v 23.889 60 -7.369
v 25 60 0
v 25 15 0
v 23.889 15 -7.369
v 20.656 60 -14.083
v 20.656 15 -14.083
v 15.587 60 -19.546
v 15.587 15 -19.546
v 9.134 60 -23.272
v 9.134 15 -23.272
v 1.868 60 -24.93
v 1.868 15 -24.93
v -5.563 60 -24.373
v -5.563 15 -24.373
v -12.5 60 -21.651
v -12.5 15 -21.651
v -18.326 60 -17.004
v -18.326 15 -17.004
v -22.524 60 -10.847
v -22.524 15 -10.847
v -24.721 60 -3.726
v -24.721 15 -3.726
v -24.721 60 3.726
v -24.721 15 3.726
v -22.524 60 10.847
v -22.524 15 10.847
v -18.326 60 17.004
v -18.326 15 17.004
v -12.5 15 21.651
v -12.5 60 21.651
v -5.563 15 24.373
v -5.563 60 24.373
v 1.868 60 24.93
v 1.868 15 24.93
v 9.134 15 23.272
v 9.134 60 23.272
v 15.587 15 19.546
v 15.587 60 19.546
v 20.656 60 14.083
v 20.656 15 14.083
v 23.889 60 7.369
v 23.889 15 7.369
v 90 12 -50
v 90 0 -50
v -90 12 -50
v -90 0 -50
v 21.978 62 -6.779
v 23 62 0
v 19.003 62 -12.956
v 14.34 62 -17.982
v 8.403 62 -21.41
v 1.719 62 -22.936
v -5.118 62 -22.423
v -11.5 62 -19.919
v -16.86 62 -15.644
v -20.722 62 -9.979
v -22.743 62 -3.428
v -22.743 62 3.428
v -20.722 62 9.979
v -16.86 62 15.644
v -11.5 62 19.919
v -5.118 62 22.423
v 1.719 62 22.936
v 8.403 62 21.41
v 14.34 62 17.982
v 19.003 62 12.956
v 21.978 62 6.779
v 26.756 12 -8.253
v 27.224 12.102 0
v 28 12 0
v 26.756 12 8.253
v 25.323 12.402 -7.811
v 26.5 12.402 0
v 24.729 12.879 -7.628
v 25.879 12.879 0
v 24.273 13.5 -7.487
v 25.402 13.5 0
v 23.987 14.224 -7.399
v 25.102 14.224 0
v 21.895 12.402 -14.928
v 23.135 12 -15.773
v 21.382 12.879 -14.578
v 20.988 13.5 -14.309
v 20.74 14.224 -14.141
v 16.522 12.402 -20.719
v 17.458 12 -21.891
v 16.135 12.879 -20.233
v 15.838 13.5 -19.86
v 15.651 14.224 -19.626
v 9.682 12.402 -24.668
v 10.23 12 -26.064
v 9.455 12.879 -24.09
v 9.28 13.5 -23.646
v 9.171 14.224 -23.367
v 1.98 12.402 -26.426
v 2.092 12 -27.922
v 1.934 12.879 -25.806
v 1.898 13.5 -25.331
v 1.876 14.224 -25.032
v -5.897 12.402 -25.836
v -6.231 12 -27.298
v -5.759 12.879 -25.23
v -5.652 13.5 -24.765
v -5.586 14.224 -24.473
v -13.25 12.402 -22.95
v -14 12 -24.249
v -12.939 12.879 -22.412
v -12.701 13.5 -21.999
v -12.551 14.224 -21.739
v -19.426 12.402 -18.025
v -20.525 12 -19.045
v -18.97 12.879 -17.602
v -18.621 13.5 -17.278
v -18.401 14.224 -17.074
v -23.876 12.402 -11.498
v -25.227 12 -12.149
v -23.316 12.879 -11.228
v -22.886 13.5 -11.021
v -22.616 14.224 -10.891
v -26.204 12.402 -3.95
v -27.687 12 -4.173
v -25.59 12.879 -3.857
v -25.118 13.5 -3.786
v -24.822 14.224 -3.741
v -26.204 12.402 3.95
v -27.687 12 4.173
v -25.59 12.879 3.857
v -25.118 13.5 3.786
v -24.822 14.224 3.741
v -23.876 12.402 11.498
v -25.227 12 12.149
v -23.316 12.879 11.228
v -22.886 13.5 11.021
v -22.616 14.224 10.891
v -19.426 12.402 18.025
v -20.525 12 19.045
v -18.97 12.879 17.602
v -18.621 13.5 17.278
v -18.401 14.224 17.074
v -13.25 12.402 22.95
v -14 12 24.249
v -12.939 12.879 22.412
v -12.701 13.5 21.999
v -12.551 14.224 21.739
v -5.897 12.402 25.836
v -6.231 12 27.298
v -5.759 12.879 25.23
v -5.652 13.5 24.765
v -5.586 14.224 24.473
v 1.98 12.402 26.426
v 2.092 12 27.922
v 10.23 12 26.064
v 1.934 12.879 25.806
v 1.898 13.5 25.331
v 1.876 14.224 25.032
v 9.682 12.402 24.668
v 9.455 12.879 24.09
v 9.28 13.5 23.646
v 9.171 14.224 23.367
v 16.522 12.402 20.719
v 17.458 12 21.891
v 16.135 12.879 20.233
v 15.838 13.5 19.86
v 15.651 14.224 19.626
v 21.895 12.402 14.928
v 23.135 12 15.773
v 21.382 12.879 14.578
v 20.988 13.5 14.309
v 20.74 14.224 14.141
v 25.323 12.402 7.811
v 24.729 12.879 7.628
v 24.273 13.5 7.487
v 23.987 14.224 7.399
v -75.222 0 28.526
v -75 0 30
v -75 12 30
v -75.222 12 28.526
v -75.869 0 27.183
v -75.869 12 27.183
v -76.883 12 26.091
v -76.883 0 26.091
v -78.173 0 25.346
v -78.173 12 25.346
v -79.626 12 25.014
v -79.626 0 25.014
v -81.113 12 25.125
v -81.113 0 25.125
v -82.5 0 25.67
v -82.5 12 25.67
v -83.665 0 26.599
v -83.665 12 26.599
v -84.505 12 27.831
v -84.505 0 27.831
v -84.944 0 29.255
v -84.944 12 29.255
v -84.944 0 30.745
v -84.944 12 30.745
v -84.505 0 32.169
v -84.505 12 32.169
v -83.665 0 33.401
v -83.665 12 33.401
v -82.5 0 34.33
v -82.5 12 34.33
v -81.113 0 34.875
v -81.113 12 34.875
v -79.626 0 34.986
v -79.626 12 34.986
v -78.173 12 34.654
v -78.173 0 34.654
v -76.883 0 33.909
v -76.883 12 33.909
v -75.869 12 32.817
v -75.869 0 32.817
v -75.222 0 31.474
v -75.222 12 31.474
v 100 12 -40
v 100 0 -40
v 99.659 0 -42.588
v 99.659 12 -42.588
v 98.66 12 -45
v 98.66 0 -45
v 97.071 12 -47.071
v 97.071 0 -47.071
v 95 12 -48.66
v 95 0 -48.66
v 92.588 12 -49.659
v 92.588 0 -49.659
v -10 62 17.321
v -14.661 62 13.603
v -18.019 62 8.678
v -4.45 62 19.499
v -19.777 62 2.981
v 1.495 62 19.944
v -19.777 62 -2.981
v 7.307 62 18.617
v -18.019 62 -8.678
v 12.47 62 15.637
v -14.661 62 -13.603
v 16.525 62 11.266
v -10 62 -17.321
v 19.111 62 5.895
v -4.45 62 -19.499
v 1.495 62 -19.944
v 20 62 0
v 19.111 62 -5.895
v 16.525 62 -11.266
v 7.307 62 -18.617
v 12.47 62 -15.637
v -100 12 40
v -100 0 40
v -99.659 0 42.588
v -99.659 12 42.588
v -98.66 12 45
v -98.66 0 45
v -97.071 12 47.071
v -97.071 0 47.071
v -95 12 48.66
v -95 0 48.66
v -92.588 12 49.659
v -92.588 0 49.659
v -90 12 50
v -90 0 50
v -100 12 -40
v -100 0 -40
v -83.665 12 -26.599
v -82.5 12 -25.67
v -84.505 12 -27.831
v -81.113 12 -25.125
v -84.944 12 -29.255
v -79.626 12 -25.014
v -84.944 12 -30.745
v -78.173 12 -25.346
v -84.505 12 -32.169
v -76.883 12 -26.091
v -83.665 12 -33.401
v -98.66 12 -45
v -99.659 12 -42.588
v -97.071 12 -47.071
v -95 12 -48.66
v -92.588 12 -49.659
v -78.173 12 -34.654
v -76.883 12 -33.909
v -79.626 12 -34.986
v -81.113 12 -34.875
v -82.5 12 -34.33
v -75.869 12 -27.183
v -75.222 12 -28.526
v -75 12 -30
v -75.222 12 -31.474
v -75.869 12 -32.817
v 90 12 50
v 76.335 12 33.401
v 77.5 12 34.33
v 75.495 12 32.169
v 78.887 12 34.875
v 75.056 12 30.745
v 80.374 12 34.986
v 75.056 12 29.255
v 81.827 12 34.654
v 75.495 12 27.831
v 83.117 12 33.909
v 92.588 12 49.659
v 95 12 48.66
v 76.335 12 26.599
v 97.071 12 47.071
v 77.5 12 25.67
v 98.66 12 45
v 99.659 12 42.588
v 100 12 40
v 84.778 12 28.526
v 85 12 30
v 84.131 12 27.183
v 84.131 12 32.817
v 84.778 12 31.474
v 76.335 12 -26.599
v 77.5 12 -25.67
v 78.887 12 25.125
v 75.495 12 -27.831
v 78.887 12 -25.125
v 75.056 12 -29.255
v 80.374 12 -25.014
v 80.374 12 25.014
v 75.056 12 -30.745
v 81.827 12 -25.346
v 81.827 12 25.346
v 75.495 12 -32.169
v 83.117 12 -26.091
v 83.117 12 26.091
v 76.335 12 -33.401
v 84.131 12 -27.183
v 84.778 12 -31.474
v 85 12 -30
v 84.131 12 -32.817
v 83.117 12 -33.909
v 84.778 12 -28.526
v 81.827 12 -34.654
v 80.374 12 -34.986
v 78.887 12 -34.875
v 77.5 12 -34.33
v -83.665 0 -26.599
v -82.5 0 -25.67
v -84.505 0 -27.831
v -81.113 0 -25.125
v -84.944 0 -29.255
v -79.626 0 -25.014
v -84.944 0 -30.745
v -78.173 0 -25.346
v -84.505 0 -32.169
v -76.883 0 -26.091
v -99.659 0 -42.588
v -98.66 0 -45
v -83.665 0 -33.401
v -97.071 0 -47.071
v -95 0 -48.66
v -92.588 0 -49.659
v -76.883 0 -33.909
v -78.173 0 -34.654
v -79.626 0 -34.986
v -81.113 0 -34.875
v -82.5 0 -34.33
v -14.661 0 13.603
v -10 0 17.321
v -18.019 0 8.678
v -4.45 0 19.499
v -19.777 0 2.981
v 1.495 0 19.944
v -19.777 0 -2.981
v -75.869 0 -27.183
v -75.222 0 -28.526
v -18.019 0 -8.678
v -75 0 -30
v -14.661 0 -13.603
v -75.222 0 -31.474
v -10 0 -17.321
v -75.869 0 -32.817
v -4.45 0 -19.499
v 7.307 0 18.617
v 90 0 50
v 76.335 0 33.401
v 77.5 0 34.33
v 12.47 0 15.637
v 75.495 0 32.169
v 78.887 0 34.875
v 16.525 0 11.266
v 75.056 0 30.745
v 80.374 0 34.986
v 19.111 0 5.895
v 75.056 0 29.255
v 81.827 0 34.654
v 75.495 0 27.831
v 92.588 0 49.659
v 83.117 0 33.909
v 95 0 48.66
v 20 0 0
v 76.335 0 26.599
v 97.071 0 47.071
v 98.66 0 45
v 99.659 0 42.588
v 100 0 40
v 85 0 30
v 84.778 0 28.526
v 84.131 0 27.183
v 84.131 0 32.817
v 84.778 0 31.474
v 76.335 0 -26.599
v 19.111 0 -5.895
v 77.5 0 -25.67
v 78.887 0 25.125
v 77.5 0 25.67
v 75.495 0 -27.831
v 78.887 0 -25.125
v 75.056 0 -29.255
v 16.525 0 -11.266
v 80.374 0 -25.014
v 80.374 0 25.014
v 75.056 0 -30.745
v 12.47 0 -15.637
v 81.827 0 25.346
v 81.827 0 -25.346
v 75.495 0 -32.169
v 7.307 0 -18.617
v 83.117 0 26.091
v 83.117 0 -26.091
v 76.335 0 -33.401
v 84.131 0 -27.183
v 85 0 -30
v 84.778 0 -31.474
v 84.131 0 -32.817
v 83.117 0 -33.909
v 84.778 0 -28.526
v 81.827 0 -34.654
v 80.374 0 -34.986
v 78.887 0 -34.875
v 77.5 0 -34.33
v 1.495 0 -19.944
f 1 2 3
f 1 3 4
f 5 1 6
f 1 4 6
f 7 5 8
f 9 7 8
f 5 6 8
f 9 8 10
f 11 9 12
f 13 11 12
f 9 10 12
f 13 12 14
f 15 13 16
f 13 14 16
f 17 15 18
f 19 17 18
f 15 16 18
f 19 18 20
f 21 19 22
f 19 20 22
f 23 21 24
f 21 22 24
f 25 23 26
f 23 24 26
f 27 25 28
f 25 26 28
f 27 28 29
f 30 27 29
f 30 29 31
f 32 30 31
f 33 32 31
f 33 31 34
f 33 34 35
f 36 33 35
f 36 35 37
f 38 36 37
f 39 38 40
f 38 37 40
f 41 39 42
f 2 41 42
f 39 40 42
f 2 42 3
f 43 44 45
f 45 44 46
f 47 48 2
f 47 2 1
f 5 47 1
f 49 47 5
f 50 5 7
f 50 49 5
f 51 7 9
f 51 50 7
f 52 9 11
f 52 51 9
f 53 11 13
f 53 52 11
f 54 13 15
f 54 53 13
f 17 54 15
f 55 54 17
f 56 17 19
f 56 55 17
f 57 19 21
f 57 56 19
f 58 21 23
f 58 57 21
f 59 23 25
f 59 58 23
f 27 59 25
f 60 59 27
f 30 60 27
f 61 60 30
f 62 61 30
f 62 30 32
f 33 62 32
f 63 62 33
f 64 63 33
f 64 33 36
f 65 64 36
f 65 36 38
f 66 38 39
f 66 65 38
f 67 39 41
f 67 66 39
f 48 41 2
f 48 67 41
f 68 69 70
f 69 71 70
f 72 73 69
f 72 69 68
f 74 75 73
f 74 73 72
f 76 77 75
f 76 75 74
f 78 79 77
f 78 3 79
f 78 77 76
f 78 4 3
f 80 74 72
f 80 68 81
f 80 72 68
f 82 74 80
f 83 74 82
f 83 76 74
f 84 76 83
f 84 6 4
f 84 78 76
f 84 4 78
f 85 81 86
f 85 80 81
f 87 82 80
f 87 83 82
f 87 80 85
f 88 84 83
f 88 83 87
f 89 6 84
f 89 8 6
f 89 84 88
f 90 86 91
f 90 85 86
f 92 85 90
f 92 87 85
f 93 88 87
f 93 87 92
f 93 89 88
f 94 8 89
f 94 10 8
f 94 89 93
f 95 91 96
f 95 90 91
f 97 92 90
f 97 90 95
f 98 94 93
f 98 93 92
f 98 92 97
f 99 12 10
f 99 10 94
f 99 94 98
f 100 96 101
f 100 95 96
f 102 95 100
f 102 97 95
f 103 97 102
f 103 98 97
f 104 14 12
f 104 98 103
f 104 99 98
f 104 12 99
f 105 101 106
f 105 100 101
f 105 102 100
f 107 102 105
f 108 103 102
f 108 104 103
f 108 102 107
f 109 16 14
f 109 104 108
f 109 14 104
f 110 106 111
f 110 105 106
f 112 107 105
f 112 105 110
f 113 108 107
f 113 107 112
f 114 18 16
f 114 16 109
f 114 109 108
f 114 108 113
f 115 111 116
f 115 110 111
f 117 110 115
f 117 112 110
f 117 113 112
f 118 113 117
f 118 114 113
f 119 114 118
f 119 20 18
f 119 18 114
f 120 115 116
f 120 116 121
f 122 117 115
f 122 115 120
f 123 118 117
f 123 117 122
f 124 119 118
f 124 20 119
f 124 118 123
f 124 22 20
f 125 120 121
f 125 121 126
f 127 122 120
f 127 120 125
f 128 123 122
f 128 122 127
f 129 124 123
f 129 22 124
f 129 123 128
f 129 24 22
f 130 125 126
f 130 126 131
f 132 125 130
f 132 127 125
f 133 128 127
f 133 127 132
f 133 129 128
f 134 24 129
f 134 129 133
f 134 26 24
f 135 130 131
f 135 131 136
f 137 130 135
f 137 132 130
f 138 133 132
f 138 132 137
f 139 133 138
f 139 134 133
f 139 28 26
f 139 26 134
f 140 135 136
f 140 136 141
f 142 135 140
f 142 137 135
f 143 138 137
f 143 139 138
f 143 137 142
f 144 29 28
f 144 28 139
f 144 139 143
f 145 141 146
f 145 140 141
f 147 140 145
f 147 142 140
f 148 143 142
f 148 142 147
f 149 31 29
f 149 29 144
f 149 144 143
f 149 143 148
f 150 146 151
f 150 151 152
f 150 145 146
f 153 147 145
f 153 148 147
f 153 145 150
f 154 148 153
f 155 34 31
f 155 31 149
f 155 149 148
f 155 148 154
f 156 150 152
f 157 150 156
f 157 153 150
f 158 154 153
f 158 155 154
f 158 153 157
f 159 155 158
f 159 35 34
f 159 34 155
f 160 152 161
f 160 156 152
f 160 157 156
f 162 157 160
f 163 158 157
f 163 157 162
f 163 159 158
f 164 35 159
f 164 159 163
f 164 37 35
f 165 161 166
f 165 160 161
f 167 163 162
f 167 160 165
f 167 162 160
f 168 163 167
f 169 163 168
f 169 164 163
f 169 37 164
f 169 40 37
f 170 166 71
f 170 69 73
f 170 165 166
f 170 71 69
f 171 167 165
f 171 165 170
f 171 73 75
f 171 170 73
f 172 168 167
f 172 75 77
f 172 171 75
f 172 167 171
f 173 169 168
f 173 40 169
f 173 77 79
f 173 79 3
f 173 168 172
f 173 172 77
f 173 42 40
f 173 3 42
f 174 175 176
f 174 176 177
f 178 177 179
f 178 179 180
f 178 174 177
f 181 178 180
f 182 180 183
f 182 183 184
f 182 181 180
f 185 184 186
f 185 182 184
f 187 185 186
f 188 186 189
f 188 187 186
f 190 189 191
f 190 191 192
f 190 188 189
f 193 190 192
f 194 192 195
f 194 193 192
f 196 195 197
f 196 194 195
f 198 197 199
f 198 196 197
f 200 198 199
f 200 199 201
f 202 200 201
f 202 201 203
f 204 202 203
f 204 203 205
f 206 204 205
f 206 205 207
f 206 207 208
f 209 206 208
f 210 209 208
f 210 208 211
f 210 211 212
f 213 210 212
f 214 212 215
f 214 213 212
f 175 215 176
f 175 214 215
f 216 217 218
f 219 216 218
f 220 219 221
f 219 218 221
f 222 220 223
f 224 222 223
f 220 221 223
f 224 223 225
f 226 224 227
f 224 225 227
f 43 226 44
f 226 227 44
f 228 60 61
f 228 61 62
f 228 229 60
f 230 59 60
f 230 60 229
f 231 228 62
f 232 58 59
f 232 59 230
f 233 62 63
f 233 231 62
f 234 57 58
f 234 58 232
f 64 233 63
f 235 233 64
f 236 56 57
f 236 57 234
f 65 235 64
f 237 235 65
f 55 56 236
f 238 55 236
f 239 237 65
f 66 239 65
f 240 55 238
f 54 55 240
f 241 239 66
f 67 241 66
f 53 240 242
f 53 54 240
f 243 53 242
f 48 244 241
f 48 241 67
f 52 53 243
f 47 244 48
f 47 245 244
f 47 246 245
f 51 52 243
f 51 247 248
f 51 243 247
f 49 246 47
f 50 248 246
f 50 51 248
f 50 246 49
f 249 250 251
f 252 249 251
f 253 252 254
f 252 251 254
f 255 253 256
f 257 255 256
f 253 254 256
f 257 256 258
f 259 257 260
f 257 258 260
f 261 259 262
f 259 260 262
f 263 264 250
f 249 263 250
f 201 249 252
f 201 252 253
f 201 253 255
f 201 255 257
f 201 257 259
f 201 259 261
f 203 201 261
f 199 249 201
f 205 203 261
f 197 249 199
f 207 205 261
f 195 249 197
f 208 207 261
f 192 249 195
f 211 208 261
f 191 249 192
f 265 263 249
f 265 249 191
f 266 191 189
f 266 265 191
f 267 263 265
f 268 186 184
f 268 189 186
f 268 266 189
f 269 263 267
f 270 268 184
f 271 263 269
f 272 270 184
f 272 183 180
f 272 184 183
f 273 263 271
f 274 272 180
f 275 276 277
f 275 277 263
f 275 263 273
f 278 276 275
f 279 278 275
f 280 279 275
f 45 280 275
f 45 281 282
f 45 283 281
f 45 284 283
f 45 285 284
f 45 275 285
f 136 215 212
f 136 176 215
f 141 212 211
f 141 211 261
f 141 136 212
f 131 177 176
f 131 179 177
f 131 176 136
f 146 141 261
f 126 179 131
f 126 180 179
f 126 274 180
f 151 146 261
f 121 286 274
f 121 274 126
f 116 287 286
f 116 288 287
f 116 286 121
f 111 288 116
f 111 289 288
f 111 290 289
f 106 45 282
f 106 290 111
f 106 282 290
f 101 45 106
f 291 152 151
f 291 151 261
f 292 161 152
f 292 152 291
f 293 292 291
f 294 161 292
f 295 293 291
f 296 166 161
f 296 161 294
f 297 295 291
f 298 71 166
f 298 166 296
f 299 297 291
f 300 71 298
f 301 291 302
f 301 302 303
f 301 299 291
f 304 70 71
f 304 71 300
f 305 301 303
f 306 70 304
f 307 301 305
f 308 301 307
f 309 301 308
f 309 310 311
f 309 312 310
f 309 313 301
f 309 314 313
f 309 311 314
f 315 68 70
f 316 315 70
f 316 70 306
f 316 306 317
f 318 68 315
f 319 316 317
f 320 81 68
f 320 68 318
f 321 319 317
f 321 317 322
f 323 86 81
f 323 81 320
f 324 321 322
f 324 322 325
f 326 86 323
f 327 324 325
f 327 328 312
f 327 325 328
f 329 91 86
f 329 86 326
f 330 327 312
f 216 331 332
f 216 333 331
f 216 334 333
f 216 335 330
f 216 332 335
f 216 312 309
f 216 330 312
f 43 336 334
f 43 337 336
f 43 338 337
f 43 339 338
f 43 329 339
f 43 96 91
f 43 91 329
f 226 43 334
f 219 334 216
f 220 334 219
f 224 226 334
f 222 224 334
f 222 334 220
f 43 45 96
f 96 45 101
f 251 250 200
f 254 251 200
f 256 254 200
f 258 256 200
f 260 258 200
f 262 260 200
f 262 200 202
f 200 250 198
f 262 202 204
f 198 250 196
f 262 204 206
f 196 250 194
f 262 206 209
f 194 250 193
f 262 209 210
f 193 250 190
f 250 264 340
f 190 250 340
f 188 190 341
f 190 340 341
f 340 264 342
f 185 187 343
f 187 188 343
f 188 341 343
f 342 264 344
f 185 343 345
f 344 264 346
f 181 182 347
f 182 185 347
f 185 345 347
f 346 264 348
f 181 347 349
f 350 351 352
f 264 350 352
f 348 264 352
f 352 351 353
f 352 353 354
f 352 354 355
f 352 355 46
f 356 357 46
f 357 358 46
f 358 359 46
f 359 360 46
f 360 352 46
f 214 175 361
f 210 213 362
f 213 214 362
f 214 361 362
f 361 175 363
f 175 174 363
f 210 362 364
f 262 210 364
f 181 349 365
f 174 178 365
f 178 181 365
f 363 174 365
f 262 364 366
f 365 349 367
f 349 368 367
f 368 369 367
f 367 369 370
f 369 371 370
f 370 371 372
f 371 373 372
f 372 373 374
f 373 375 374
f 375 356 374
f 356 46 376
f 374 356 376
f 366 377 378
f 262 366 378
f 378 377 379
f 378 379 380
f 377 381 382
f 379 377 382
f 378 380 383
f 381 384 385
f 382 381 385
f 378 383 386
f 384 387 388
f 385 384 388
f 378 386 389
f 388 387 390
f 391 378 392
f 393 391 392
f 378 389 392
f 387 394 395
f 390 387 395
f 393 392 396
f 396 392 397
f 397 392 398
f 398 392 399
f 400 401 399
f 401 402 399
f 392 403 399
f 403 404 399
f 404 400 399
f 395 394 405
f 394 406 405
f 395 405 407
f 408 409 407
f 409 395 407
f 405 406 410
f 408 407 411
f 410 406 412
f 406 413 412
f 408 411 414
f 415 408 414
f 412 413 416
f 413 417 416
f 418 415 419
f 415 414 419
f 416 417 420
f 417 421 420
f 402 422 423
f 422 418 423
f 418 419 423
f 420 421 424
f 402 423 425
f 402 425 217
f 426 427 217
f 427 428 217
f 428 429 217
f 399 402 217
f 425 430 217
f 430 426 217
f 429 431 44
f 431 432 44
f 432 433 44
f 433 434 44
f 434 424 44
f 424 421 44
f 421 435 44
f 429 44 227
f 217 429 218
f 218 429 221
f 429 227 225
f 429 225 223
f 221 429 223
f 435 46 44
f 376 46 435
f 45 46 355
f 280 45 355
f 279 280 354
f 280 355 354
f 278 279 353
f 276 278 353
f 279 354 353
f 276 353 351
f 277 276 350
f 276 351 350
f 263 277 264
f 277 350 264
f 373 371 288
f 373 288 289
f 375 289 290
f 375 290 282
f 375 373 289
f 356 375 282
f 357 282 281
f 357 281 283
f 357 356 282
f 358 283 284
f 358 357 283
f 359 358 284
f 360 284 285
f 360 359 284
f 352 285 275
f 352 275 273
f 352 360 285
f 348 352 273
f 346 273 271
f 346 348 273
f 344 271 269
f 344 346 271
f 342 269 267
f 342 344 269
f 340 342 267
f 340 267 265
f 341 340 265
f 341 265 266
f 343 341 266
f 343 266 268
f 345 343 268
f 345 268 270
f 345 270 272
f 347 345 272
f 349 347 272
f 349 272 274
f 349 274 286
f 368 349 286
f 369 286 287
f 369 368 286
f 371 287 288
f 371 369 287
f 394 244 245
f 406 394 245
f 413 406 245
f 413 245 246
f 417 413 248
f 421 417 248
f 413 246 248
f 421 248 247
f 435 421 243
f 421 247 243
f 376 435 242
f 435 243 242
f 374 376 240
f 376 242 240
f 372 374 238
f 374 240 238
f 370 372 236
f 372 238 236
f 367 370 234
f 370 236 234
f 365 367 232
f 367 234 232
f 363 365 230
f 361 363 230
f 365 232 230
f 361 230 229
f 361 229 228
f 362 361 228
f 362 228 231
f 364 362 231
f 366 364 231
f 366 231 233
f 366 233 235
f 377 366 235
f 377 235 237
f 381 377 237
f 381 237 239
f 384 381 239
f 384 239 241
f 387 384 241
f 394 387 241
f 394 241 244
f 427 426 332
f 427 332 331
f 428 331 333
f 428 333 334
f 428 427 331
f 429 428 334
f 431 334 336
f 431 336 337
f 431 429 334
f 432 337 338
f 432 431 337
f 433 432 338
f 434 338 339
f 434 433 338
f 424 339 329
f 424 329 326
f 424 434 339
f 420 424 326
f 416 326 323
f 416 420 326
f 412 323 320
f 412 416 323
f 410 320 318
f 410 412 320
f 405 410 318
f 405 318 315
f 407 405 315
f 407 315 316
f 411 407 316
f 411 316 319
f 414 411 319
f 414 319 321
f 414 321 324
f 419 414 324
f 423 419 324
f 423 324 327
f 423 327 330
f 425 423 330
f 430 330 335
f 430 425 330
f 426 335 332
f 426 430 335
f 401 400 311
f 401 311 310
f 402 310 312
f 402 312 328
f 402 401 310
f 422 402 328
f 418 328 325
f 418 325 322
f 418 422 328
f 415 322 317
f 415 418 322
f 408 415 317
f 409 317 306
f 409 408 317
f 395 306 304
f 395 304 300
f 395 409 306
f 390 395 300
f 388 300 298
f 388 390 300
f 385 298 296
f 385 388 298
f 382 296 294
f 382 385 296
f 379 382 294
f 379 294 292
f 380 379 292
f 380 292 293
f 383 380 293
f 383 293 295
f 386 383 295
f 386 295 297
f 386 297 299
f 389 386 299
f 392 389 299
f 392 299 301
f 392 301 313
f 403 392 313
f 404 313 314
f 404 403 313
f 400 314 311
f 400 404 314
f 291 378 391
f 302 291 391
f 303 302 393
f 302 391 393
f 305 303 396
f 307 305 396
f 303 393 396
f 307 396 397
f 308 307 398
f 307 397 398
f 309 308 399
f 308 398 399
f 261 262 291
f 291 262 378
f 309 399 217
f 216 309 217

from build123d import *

# Parameters (mm, degrees)
SKETCH1_R           = 5
BOSS_EXTRUDE1_DEPTH = 12
SKETCH2_R           = 25
BOSS_EXTRUDE2_DEPTH = 50
SKETCH3_R           = 20
CUT_EXTRUDE1_DEPTH  = 63
FILLET1_R           = 3
CHAMFER1_SIZE       = 2


with BuildPart() as part:
    # Sketch1 → Boss-Extrude1 (new body)
    with BuildSketch(Plane(origin=(0, 0, 0), x_dir=(1, 0, 0), z_dir=(0, 1, 0))):
        with BuildLine():
            Line((-90, -50), (90, -50))
            ThreePointArc((90, -50), (97.071067812, -47.071067812), (100, -40))
            Line((100, -40), (100, 40))
            ThreePointArc((100, 40), (97.071067812, 47.071067812), (90, 50))
            Line((90, 50), (-90, 50))
            ThreePointArc((-90, 50), (-97.071067812, 47.071067812), (-100, 40))
            Line((-100, 40), (-100, -40))
            ThreePointArc((-100, -40), (-97.071067812, -47.071067812), (-90, -50))
        make_face()
        with Locations((-80, -30)):
            Circle(SKETCH1_R, mode=Mode.SUBTRACT)
        with Locations((-80, 30)):
            Circle(SKETCH1_R, mode=Mode.SUBTRACT)
        with Locations((80, 30)):
            Circle(SKETCH1_R, mode=Mode.SUBTRACT)
        with Locations((80, -30)):
            Circle(SKETCH1_R, mode=Mode.SUBTRACT)
    extrude(amount=BOSS_EXTRUDE1_DEPTH)

    # Sketch2 → Boss-Extrude2 (add)
    with BuildSketch(Plane(origin=(0, 12, 0), x_dir=(1, 0, 0), z_dir=(0, 1, 0))):
        Circle(SKETCH2_R)
    extrude(amount=BOSS_EXTRUDE2_DEPTH)

    # Sketch3 → Cut-Extrude1 (cut, through all)
    with BuildSketch(Plane(origin=(0, 62, 0), x_dir=(1, 0, 0), z_dir=(0, 1, 0))):
        Circle(SKETCH3_R)
    extrude(amount=-CUT_EXTRUDE1_DEPTH, mode=Mode.SUBTRACT)

    # Fillet1
    fillet1_edges = [part.edges().sort_by_distance(p)[0] for p in [
        (-25, 12, 0),
    ]]
    fillet(fillet1_edges, radius=FILLET1_R)

    # Chamfer1
    chamfer1_edges = [part.edges().sort_by_distance(p)[0] for p in [
        (-25, 62, 0),
    ]]
    chamfer(chamfer1_edges, length=CHAMFER1_SIZE)


solid = part.part
